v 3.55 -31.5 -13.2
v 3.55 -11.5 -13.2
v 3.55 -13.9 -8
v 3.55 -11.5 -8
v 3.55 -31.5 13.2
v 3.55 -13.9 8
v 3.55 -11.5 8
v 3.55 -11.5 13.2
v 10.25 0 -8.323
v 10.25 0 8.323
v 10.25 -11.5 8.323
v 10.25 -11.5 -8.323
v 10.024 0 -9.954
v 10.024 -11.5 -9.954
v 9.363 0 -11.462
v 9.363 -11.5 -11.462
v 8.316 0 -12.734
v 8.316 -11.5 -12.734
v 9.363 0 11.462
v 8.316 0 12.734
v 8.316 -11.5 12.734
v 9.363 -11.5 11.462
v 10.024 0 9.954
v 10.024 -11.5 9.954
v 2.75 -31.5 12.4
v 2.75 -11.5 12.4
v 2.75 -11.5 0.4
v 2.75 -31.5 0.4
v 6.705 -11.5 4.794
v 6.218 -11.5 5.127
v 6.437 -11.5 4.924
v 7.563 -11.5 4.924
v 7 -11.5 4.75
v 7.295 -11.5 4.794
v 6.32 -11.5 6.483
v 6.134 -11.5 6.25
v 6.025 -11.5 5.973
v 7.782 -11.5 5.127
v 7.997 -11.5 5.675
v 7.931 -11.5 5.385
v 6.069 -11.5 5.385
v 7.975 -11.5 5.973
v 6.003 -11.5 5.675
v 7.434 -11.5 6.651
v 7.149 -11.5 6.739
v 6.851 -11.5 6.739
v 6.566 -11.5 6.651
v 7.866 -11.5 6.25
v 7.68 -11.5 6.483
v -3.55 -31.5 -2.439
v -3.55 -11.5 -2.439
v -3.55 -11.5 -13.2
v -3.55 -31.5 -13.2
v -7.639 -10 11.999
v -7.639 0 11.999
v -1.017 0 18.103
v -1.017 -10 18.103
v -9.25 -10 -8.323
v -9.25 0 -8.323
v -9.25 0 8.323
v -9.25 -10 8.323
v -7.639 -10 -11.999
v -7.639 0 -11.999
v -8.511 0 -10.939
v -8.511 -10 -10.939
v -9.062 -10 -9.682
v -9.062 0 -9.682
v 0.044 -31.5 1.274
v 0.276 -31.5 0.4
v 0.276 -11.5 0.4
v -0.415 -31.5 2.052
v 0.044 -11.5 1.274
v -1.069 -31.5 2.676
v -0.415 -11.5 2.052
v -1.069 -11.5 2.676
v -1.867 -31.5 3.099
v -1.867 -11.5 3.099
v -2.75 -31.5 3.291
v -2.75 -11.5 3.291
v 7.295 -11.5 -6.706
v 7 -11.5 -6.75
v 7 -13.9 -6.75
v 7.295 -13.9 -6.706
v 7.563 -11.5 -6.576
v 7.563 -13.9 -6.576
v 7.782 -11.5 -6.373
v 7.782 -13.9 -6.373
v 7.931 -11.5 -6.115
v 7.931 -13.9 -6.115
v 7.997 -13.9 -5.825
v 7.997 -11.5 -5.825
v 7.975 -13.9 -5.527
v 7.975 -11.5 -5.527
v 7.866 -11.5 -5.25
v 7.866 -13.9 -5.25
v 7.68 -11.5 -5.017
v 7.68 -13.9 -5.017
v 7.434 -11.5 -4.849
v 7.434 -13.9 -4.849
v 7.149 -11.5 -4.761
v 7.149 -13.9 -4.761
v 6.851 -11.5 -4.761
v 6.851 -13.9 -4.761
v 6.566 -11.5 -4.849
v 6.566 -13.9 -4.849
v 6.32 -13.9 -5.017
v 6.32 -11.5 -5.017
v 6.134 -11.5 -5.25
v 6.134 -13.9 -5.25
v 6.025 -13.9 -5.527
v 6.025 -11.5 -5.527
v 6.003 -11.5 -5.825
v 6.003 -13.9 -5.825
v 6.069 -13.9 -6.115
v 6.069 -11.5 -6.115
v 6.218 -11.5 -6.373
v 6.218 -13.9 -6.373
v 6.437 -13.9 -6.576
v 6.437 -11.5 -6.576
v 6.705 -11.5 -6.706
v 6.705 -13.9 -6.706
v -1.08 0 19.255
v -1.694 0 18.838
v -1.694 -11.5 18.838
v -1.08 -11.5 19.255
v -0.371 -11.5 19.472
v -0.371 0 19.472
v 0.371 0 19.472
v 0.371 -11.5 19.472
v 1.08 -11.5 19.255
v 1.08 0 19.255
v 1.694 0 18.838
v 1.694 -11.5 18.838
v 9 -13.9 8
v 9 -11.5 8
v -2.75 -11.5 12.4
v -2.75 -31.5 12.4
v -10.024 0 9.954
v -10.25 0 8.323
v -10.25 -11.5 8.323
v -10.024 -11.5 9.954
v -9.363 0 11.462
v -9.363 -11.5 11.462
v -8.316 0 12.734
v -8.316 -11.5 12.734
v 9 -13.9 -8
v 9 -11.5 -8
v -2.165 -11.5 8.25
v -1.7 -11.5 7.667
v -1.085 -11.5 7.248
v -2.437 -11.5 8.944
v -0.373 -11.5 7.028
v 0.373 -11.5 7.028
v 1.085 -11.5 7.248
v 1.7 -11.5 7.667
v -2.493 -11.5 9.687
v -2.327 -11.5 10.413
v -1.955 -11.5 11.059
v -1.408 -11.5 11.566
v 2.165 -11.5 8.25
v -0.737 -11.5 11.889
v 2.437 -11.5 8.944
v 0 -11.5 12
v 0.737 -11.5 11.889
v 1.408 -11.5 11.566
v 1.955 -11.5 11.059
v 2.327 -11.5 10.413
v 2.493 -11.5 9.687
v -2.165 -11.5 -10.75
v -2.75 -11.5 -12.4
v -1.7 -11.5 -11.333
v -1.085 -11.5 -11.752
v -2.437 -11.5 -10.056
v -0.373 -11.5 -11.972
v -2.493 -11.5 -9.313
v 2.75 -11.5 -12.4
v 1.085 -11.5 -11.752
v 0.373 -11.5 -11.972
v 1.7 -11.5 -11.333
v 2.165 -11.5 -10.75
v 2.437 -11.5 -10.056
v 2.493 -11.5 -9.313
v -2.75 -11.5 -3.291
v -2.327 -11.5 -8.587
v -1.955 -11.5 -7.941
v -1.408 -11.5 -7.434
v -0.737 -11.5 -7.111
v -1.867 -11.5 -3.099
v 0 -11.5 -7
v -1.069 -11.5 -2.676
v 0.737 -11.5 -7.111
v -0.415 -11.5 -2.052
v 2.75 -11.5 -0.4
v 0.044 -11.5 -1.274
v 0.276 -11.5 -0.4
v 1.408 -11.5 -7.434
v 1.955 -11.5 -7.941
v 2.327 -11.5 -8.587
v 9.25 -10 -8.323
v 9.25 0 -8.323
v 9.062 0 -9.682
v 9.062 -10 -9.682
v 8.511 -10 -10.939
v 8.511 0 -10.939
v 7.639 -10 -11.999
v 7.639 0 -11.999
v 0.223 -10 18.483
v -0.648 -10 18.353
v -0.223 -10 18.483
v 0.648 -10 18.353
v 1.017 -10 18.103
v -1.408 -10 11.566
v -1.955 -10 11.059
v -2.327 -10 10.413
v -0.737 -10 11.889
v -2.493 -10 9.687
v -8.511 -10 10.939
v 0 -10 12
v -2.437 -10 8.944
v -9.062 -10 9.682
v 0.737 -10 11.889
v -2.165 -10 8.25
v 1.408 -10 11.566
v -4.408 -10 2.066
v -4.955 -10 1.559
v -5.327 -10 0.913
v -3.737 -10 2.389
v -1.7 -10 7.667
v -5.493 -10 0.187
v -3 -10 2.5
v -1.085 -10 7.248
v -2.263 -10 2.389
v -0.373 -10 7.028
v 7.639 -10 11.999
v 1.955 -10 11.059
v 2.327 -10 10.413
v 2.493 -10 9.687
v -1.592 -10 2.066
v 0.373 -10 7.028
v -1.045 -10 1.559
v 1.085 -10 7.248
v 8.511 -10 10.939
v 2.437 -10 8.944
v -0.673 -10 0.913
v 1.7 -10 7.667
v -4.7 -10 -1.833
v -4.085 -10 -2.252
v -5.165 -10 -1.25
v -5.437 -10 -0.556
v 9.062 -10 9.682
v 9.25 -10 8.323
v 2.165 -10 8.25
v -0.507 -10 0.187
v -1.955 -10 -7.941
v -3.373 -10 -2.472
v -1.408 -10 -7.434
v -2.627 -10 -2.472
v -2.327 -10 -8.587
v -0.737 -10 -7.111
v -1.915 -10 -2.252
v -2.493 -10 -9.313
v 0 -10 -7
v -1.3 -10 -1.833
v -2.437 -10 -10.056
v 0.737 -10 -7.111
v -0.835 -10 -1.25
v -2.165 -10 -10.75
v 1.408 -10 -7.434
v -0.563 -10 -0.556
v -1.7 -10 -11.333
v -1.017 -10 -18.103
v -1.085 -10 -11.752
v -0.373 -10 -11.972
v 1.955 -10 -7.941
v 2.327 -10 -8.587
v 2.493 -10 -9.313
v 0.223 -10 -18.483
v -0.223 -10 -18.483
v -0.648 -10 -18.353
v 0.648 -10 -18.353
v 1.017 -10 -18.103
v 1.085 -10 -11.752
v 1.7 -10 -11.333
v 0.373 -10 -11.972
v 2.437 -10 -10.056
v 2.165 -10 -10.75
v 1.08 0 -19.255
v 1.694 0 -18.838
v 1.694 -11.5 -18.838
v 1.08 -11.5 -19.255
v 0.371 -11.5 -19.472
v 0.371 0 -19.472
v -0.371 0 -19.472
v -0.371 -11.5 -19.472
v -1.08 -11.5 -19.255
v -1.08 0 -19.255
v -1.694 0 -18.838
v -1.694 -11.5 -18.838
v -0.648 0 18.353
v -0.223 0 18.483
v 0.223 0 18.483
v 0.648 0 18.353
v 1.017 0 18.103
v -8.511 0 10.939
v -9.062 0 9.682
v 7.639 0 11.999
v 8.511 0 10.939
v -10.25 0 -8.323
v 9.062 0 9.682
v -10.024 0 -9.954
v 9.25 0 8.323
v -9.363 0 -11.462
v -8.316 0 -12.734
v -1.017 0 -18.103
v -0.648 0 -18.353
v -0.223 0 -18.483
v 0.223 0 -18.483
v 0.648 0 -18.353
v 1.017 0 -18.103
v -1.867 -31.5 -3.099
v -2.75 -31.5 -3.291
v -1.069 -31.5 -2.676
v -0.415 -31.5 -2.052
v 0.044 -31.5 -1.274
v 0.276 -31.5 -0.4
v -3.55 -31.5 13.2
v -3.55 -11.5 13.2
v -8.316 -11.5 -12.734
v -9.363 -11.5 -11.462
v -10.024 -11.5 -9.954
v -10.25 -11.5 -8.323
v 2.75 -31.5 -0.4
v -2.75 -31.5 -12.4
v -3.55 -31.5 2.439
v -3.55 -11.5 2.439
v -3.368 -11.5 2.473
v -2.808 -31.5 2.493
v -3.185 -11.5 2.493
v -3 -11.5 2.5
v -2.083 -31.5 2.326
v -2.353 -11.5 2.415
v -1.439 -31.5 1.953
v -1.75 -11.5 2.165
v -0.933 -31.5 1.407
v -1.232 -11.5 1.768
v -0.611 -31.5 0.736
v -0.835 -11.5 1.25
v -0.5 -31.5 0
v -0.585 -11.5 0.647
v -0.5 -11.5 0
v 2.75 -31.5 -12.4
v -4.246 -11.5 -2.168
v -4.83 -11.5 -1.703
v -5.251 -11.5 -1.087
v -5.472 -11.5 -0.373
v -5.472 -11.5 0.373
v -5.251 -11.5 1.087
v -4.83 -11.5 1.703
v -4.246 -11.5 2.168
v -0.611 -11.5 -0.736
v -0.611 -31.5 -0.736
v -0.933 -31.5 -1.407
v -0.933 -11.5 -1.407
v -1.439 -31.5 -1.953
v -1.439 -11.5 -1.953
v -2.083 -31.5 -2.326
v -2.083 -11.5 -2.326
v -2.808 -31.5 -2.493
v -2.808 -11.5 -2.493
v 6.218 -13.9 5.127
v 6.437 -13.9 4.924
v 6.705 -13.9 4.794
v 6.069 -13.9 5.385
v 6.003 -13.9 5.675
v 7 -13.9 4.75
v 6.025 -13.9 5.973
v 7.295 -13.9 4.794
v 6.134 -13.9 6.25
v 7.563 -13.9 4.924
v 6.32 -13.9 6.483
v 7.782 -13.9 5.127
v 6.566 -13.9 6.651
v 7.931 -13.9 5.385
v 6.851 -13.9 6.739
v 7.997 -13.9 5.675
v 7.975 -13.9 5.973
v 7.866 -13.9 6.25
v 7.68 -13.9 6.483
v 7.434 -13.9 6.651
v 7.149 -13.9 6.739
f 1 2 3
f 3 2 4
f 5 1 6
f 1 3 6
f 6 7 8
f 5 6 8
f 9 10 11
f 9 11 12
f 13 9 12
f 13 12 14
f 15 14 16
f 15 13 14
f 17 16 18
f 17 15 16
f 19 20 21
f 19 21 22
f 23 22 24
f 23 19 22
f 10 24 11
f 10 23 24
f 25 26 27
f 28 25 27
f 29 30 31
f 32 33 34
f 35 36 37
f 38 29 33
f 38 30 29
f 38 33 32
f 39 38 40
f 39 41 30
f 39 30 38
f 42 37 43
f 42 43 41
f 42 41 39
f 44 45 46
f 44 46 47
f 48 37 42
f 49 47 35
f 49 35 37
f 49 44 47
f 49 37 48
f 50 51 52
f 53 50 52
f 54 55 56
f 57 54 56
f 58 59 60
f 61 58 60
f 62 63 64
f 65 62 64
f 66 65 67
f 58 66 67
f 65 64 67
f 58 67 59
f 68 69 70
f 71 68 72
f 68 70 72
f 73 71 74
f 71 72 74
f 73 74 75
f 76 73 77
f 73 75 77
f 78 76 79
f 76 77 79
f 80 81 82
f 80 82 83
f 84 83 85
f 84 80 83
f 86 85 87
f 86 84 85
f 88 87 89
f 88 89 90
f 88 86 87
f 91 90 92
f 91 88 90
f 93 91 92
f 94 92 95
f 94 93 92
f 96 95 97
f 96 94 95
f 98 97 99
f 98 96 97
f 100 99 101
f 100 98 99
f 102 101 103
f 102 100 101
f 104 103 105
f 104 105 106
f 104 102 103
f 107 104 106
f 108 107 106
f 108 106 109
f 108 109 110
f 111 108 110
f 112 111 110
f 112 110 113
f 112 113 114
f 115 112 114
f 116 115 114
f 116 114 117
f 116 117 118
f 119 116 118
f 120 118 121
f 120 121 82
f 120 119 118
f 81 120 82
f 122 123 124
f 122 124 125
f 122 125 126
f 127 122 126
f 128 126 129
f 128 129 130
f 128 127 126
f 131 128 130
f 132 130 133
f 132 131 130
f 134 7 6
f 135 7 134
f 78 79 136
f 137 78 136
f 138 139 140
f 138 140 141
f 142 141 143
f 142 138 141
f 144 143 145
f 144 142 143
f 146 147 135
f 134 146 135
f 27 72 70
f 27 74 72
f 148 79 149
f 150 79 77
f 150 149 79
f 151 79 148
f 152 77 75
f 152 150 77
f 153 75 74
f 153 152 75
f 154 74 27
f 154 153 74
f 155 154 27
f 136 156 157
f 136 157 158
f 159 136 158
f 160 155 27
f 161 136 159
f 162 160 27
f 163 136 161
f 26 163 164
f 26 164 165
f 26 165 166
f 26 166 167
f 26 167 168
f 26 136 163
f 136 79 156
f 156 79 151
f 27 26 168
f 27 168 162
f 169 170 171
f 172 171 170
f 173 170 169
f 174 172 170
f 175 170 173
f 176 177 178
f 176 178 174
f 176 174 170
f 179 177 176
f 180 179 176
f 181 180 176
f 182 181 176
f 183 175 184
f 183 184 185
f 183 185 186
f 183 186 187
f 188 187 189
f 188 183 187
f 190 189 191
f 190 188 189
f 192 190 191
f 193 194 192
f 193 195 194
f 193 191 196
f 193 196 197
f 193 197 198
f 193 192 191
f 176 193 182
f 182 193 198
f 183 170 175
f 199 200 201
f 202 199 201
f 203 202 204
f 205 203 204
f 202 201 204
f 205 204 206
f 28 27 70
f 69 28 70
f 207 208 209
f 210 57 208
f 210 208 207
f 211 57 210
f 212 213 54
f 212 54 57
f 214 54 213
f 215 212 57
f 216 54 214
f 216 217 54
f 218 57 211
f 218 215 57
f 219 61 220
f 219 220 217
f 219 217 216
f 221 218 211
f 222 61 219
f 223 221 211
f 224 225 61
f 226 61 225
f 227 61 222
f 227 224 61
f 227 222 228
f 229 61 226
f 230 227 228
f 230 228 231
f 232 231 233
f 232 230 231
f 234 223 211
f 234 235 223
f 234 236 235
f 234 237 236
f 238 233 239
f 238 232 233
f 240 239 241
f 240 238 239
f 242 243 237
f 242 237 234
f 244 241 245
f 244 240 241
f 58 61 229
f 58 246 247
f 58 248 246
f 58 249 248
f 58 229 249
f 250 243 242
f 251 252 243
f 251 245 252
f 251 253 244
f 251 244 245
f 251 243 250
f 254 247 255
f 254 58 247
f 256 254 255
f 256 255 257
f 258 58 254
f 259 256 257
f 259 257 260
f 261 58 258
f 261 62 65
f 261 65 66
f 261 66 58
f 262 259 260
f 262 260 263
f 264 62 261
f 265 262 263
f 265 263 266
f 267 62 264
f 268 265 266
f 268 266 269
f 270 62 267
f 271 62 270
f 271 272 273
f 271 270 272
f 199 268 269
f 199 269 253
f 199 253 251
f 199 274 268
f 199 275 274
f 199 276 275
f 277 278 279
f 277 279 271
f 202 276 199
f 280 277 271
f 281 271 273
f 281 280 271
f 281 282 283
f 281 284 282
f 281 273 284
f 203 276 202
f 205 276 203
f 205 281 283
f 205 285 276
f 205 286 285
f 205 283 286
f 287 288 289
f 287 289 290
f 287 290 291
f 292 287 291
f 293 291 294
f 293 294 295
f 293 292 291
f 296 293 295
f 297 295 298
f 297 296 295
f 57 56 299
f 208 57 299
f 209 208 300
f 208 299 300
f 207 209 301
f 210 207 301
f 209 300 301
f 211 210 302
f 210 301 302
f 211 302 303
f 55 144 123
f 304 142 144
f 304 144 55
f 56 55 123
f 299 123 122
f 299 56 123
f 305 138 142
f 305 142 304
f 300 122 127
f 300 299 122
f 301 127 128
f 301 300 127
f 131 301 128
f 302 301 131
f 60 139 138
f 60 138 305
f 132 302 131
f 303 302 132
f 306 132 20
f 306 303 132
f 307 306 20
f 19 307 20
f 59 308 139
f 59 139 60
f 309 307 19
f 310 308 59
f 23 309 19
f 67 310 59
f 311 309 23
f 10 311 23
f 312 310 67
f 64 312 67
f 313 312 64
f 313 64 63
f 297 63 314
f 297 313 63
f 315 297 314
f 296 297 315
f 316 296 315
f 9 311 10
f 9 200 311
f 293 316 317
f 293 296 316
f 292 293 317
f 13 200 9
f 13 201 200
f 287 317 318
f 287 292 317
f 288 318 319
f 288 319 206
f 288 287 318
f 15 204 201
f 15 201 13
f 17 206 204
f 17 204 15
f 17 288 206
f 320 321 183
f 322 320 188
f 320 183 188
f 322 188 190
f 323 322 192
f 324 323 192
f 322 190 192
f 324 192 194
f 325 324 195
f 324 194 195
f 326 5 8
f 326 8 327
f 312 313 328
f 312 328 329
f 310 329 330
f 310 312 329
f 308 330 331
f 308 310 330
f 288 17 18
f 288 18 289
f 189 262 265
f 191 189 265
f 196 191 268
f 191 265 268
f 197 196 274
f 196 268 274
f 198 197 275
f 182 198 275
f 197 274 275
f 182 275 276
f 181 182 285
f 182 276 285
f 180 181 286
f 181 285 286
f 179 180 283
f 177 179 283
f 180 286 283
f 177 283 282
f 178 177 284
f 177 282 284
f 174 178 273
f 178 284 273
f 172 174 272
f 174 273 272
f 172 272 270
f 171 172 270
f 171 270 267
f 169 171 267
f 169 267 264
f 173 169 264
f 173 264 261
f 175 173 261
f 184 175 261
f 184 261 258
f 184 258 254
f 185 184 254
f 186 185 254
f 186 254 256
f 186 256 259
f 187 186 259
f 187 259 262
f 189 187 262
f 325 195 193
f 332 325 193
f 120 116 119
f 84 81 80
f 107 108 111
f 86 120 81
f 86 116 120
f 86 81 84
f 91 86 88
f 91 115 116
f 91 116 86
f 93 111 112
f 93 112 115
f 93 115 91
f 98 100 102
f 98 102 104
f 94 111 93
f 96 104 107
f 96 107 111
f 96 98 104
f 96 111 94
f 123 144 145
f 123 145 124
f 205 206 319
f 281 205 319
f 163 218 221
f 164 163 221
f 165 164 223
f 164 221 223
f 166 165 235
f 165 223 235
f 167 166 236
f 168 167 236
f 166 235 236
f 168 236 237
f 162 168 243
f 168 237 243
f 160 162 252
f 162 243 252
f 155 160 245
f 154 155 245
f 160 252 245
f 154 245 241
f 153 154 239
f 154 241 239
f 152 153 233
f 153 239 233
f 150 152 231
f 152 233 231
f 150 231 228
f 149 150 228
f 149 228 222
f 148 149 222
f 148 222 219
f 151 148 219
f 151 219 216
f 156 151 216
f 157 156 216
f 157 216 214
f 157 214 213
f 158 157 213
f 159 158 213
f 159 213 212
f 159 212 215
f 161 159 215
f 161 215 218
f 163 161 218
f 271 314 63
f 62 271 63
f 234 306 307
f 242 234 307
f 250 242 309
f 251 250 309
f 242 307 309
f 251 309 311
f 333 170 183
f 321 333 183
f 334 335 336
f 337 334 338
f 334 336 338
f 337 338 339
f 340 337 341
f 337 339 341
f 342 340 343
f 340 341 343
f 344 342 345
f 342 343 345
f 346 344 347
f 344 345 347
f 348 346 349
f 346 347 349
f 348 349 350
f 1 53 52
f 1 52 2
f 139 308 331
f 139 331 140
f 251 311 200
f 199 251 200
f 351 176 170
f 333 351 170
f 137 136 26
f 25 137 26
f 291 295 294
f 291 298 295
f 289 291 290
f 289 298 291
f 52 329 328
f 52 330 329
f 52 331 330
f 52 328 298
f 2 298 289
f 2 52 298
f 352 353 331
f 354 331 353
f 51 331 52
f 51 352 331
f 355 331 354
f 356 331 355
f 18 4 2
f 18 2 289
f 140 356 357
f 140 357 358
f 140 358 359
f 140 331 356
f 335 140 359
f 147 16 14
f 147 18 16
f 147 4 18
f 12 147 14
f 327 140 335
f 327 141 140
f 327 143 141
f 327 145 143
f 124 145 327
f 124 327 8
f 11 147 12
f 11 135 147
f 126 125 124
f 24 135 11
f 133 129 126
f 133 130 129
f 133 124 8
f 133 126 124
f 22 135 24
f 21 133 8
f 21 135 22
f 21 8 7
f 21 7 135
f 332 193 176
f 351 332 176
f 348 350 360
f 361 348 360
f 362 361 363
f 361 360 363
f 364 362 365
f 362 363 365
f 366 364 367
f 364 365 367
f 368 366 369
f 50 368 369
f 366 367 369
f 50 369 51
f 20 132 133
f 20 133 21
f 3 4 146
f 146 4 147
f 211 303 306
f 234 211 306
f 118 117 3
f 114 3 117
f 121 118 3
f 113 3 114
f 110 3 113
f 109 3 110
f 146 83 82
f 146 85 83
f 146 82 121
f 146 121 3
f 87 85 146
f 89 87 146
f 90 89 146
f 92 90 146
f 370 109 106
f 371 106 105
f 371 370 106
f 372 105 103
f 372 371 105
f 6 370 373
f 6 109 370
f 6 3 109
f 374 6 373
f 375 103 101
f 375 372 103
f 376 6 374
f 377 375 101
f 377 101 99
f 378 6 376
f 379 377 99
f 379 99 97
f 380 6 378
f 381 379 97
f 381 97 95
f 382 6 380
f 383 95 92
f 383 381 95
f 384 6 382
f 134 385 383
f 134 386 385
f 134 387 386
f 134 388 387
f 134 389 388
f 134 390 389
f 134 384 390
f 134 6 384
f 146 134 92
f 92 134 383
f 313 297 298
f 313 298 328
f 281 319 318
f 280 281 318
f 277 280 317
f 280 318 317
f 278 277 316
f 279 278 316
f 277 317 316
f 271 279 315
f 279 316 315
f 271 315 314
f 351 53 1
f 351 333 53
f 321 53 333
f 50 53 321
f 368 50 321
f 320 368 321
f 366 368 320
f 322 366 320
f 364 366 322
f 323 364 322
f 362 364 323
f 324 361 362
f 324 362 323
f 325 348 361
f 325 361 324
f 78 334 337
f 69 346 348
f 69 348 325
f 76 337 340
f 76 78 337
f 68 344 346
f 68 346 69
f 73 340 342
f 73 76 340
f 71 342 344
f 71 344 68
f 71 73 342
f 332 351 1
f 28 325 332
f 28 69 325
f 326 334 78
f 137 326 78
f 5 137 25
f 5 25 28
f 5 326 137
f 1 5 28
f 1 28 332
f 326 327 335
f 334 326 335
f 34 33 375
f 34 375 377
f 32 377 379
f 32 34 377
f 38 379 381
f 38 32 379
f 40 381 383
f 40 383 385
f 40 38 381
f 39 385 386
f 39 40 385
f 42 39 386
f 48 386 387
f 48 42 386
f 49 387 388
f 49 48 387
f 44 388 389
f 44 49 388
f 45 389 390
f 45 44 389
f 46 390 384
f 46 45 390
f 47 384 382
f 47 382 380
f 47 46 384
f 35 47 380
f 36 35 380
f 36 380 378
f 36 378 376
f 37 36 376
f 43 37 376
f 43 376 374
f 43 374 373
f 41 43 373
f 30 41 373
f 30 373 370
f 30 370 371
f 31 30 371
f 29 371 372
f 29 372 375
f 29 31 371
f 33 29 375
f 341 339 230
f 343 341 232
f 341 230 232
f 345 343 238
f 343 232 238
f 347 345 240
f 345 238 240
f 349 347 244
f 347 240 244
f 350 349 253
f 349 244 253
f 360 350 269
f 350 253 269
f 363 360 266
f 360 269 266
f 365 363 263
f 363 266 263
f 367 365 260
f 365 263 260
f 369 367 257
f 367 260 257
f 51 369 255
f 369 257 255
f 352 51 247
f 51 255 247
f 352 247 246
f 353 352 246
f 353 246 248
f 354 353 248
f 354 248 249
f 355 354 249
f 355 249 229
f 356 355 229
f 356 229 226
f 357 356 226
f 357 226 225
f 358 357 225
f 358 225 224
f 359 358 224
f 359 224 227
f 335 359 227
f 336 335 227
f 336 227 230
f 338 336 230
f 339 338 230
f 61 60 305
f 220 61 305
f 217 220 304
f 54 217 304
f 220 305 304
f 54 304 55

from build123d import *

# Parameters (mm, degrees)
ESBO_O1_W                = 26.7
ESBO_O1_H                = 39.3
RESSALTO_EXTRUS_O1_DEPTH = 38.5
CORTE_EXTRUS_O1_DEPTH    = 10
ESBO_O4_W                = 26.7
ESBO_O4_H                = 39.3
CORTE_EXTRUS_O2_DEPTH    = 10
ESBO_O5_W                = 26.7
ESBO_O5_H                = 39.3
ESBO_O5_W_2              = 22.6
ESBO_O5_H_2              = 27
CORTE_EXTRUS_O4_DEPTH    = 27
ESBO_O6_R                = 2.5
CORTE_EXTRUS_O5_DEPTH    = 5
ESBO_O7_W                = 2.05
ESBO_O7_H                = 1
RESSALTO_EXTRUS_O2_DEPTH = 4
CUT_EXTRUDE1_DEPTH       = 10
CUT_EXTRUDE1_DEPTH_BACK  = 100
SKETCH2_W                = 27
SKETCH2_H                = 27
ESBO_O4_3_W              = 26.7
ESBO_O4_3_H              = 39.3
CUT_EXTRUDE3_DEPTH       = 100
BOSS_EXTRUDE1_DEPTH      = 20
SKETCH6_3_W              = 5.45
SKETCH6_3_H              = 16
SKETCH6_3_R              = 1
BOSS_EXTRUDE2_DEPTH      = 2.4


with BuildPart() as part:
    # Esboço1 → Ressalto-extrusão1 (new body)
    with BuildSketch(Plane(origin=(0, 0, 0), x_dir=(1, 0, 0), z_dir=(0, 1, 0))):
        Rectangle(ESBO_O1_W, ESBO_O1_H)
    extrude(amount=-RESSALTO_EXTRUS_O1_DEPTH)

    # Esboço2 → Corte-extrusão1 (cut)
    with BuildSketch(Plane(origin=(0, 0, 0), x_dir=(1, 0, 0), z_dir=(0, 1, 0))):
        with BuildLine():
            Line((1.016622231, -18.102941176), (7.638740771, -11.999086257))
            ThreePointArc((7.638740771, -11.999086257), (8.829503459, -10.32964035), (9.25, -8.322615669))
            Line((9.25, -8.322615669), (9.25, 8.322615669))
            ThreePointArc((9.25, 8.322615669), (8.829503459, 10.32964035), (7.638740771, 11.999086257))
            Line((7.638740771, 11.999086257), (1.016622231, 18.102941176))
            ThreePointArc((1.016622231, 18.102941176), (0, 18.5), (-1.016622231, 18.102941176))
            Line((-1.016622231, 18.102941176), (-7.638740771, 11.999086257))
            ThreePointArc((-7.638740771, 11.999086257), (-8.829503459, 10.32964035), (-9.25, 8.322615669))
            Line((-9.25, 8.322615669), (-9.25, -8.322615669))
            ThreePointArc((-9.25, -8.322615669), (-8.829503459, -10.32964035), (-7.638740771, -11.999086257))
            Line((-7.638740771, -11.999086257), (-1.016622231, -18.102941176))
            ThreePointArc((-1.016622231, -18.102941176), (0, -18.5), (1.016622231, -18.102941176))
        make_face()
    extrude(amount=-CORTE_EXTRUS_O1_DEPTH, mode=Mode.SUBTRACT)

    # Esboço4 → Corte-extrusão2 (cut)
    with BuildSketch(Plane(origin=(0, 0, 0), x_dir=(1, 0, 0), z_dir=(0, 1, 0))):
        Rectangle(ESBO_O4_W, ESBO_O4_H)
        with BuildLine():
            Line((-1.694370386, -18.838235294), (-8.316488925, -12.734380374))
            ThreePointArc((-8.316488925, -12.734380374), (-9.74540415, -10.731045286), (-10.25, -8.322615669))
            Line((-10.25, -8.322615669), (-10.25, 8.322615669))
            ThreePointArc((-10.25, 8.322615669), (-9.74540415, 10.731045286), (-8.316488925, 12.734380374))
            Line((-8.316488925, 12.734380374), (-1.694370386, 18.838235294))
            ThreePointArc((-1.694370386, 18.838235294), (0, 19.5), (1.694370386, 18.838235294))
            Line((1.694370386, 18.838235294), (8.316488925, 12.734380374))
            ThreePointArc((8.316488925, 12.734380374), (9.74540415, 10.731045286), (10.25, 8.322615669))
            Line((10.25, 8.322615669), (10.25, -8.322615669))
            ThreePointArc((10.25, -8.322615669), (9.74540415, -10.731045286), (8.316488925, -12.734380374))
            Line((8.316488925, -12.734380374), (1.694370386, -18.838235294))
            ThreePointArc((1.694370386, -18.838235294), (0, -19.5), (-1.694370386, -18.838235294))
        make_face(mode=Mode.SUBTRACT)
    extrude(amount=-CORTE_EXTRUS_O2_DEPTH, mode=Mode.SUBTRACT)

    # Esboço5 → Corte-extrusão4 (cut)
    with BuildSketch(Plane.XZ.offset(38.5)):
        Rectangle(ESBO_O5_W, ESBO_O5_H)
        Rectangle(ESBO_O5_W_2, ESBO_O5_H_2, mode=Mode.SUBTRACT)
    extrude(amount=-CORTE_EXTRUS_O4_DEPTH, mode=Mode.SUBTRACT)

    # Esboço6 → Corte-extrusão5 (cut)
    with BuildSketch(Plane(origin=(0, -10, 0), x_dir=(1, 0, 0), z_dir=(0, 1, 0))):
        with Locations((0, -9.5)):
            Circle(ESBO_O6_R)
        with Locations((0, 9.5)):
            Circle(ESBO_O6_R)
        with Locations((-3, 0)):
            Circle(ESBO_O6_R)
    extrude(amount=-CORTE_EXTRUS_O5_DEPTH, mode=Mode.SUBTRACT)

    # Esboço7 → Ressalto-extrusão2 (add)
    with BuildSketch(Plane.XZ.offset(11.5)):
        with Locations((12.325, 13)):
            Rectangle(ESBO_O7_W, ESBO_O7_H)
        with Locations((-12.325, 13)):
            Rectangle(ESBO_O7_W, ESBO_O7_H)
        with Locations((-12.325, -13)):
            Rectangle(ESBO_O7_W, ESBO_O7_H)
        with Locations((12.325, -13)):
            Rectangle(ESBO_O7_W, ESBO_O7_H)
    extrude(amount=RESSALTO_EXTRUS_O2_DEPTH)

    # Sketch2 → Cut-Extrude1 (cut, two sides: drawn at the far end of the back side and taken through both)
    with BuildSketch(Plane(origin=(11.3, 0, 0), x_dir=(0, 0, -1), z_dir=(1, 0, 0)).offset(-CUT_EXTRUDE1_DEPTH_BACK)):
        with Locations((0, -25)):
            Rectangle(SKETCH2_W, SKETCH2_H)
    extrude(amount=CUT_EXTRUDE1_DEPTH + CUT_EXTRUDE1_DEPTH_BACK, mode=Mode.SUBTRACT)

    # Esboço4<3> → Cut-Extrude3 (cut)
    with BuildSketch(Plane(origin=(0, 0, 0), x_dir=(1, 0, 0), z_dir=(0, 1, 0))):
        Rectangle(ESBO_O4_3_W, ESBO_O4_3_H)
        with BuildLine():
            Line((-1.694370386, -18.838235294), (-8.316488925, -12.734380374))
            ThreePointArc((-8.316488925, -12.734380374), (-9.74540415, -10.731045286), (-10.25, -8.322615669))
            Line((-10.25, -8.322615669), (-10.25, 8.322615669))
            ThreePointArc((-10.25, 8.322615669), (-9.74540415, 10.731045286), (-8.316488925, 12.734380374))
            Line((-8.316488925, 12.734380374), (-1.694370386, 18.838235294))
            ThreePointArc((-1.694370386, 18.838235294), (0, 19.5), (1.694370386, 18.838235294))
            Line((1.694370386, 18.838235294), (8.316488925, 12.734380374))
            ThreePointArc((8.316488925, 12.734380374), (9.74540415, 10.731045286), (10.25, 8.322615669))
            Line((10.25, 8.322615669), (10.25, -8.322615669))
            ThreePointArc((10.25, -8.322615669), (9.74540415, -10.731045286), (8.316488925, -12.734380374))
            Line((8.316488925, -12.734380374), (1.694370386, -18.838235294))
            ThreePointArc((1.694370386, -18.838235294), (0, -19.5), (-1.694370386, -18.838235294))
        make_face(mode=Mode.SUBTRACT)
    extrude(amount=-CUT_EXTRUDE3_DEPTH, mode=Mode.SUBTRACT)

    # Sketch6 → Boss-Extrude1 (add)
    with BuildSketch(Plane.XZ.offset(11.5)):
        with BuildLine():
            Line((-3.55, 13.2), (-3.55, 2.43874968))
            ThreePointArc((-3.55, 2.43874968), (-1.4387505, 1.952562419), (-0.5, 0))
            ThreePointArc((-0.5, 0), (-1.4387505, -1.952562419), (-3.55, -2.43874968))
            Line((-3.55, -2.43874968), (-3.55, -13.2))
            Line((-3.55, -13.2), (3.55, -13.2))
            Line((3.55, -13.2), (3.55, -8))
            Line((3.55, -8), (3.55, 8))
            Line((3.55, 8), (3.55, 13.2))
            Line((3.55, 13.2), (-3.55, 13.2))
        make_face()
        with BuildLine():
            Line((2.75, -12.4), (-2.75, -12.4))
            Line((-2.75, -12.4), (-2.75, -3.290516677))
            ThreePointArc((-2.75, -3.290516677), (-0.720448476, -2.386135967), (0.275667871, -0.4))
            Line((0.275667871, -0.4), (2.75, -0.4))
            Line((2.75, -0.4), (2.75, -12.4))
        make_face(mode=Mode.SUBTRACT)
        with BuildLine():
            Line((2.75, 12.4), (2.75, 0.4))
            Line((2.75, 0.4), (0.275667871, 0.4))
            ThreePointArc((0.275667871, 0.4), (-0.720448476, 2.386135967), (-2.75, 3.290516677))
            Line((-2.75, 3.290516677), (-2.75, 12.4))
            Line((-2.75, 12.4), (2.75, 12.4))
        make_face(mode=Mode.SUBTRACT)
    extrude(amount=BOSS_EXTRUDE1_DEPTH)

    # Sketch6<3> → Boss-Extrude2 (add)
    with BuildSketch(Plane.XZ.offset(11.5)):
        with Locations((6.275, 0)):
            Rectangle(SKETCH6_3_W, SKETCH6_3_H)
        with Locations((7, -5.75)):
            Circle(SKETCH6_3_R, mode=Mode.SUBTRACT)
        with Locations((7, 5.75)):
            Circle(SKETCH6_3_R, mode=Mode.SUBTRACT)
    extrude(amount=BOSS_EXTRUDE2_DEPTH)


solid = part.part
